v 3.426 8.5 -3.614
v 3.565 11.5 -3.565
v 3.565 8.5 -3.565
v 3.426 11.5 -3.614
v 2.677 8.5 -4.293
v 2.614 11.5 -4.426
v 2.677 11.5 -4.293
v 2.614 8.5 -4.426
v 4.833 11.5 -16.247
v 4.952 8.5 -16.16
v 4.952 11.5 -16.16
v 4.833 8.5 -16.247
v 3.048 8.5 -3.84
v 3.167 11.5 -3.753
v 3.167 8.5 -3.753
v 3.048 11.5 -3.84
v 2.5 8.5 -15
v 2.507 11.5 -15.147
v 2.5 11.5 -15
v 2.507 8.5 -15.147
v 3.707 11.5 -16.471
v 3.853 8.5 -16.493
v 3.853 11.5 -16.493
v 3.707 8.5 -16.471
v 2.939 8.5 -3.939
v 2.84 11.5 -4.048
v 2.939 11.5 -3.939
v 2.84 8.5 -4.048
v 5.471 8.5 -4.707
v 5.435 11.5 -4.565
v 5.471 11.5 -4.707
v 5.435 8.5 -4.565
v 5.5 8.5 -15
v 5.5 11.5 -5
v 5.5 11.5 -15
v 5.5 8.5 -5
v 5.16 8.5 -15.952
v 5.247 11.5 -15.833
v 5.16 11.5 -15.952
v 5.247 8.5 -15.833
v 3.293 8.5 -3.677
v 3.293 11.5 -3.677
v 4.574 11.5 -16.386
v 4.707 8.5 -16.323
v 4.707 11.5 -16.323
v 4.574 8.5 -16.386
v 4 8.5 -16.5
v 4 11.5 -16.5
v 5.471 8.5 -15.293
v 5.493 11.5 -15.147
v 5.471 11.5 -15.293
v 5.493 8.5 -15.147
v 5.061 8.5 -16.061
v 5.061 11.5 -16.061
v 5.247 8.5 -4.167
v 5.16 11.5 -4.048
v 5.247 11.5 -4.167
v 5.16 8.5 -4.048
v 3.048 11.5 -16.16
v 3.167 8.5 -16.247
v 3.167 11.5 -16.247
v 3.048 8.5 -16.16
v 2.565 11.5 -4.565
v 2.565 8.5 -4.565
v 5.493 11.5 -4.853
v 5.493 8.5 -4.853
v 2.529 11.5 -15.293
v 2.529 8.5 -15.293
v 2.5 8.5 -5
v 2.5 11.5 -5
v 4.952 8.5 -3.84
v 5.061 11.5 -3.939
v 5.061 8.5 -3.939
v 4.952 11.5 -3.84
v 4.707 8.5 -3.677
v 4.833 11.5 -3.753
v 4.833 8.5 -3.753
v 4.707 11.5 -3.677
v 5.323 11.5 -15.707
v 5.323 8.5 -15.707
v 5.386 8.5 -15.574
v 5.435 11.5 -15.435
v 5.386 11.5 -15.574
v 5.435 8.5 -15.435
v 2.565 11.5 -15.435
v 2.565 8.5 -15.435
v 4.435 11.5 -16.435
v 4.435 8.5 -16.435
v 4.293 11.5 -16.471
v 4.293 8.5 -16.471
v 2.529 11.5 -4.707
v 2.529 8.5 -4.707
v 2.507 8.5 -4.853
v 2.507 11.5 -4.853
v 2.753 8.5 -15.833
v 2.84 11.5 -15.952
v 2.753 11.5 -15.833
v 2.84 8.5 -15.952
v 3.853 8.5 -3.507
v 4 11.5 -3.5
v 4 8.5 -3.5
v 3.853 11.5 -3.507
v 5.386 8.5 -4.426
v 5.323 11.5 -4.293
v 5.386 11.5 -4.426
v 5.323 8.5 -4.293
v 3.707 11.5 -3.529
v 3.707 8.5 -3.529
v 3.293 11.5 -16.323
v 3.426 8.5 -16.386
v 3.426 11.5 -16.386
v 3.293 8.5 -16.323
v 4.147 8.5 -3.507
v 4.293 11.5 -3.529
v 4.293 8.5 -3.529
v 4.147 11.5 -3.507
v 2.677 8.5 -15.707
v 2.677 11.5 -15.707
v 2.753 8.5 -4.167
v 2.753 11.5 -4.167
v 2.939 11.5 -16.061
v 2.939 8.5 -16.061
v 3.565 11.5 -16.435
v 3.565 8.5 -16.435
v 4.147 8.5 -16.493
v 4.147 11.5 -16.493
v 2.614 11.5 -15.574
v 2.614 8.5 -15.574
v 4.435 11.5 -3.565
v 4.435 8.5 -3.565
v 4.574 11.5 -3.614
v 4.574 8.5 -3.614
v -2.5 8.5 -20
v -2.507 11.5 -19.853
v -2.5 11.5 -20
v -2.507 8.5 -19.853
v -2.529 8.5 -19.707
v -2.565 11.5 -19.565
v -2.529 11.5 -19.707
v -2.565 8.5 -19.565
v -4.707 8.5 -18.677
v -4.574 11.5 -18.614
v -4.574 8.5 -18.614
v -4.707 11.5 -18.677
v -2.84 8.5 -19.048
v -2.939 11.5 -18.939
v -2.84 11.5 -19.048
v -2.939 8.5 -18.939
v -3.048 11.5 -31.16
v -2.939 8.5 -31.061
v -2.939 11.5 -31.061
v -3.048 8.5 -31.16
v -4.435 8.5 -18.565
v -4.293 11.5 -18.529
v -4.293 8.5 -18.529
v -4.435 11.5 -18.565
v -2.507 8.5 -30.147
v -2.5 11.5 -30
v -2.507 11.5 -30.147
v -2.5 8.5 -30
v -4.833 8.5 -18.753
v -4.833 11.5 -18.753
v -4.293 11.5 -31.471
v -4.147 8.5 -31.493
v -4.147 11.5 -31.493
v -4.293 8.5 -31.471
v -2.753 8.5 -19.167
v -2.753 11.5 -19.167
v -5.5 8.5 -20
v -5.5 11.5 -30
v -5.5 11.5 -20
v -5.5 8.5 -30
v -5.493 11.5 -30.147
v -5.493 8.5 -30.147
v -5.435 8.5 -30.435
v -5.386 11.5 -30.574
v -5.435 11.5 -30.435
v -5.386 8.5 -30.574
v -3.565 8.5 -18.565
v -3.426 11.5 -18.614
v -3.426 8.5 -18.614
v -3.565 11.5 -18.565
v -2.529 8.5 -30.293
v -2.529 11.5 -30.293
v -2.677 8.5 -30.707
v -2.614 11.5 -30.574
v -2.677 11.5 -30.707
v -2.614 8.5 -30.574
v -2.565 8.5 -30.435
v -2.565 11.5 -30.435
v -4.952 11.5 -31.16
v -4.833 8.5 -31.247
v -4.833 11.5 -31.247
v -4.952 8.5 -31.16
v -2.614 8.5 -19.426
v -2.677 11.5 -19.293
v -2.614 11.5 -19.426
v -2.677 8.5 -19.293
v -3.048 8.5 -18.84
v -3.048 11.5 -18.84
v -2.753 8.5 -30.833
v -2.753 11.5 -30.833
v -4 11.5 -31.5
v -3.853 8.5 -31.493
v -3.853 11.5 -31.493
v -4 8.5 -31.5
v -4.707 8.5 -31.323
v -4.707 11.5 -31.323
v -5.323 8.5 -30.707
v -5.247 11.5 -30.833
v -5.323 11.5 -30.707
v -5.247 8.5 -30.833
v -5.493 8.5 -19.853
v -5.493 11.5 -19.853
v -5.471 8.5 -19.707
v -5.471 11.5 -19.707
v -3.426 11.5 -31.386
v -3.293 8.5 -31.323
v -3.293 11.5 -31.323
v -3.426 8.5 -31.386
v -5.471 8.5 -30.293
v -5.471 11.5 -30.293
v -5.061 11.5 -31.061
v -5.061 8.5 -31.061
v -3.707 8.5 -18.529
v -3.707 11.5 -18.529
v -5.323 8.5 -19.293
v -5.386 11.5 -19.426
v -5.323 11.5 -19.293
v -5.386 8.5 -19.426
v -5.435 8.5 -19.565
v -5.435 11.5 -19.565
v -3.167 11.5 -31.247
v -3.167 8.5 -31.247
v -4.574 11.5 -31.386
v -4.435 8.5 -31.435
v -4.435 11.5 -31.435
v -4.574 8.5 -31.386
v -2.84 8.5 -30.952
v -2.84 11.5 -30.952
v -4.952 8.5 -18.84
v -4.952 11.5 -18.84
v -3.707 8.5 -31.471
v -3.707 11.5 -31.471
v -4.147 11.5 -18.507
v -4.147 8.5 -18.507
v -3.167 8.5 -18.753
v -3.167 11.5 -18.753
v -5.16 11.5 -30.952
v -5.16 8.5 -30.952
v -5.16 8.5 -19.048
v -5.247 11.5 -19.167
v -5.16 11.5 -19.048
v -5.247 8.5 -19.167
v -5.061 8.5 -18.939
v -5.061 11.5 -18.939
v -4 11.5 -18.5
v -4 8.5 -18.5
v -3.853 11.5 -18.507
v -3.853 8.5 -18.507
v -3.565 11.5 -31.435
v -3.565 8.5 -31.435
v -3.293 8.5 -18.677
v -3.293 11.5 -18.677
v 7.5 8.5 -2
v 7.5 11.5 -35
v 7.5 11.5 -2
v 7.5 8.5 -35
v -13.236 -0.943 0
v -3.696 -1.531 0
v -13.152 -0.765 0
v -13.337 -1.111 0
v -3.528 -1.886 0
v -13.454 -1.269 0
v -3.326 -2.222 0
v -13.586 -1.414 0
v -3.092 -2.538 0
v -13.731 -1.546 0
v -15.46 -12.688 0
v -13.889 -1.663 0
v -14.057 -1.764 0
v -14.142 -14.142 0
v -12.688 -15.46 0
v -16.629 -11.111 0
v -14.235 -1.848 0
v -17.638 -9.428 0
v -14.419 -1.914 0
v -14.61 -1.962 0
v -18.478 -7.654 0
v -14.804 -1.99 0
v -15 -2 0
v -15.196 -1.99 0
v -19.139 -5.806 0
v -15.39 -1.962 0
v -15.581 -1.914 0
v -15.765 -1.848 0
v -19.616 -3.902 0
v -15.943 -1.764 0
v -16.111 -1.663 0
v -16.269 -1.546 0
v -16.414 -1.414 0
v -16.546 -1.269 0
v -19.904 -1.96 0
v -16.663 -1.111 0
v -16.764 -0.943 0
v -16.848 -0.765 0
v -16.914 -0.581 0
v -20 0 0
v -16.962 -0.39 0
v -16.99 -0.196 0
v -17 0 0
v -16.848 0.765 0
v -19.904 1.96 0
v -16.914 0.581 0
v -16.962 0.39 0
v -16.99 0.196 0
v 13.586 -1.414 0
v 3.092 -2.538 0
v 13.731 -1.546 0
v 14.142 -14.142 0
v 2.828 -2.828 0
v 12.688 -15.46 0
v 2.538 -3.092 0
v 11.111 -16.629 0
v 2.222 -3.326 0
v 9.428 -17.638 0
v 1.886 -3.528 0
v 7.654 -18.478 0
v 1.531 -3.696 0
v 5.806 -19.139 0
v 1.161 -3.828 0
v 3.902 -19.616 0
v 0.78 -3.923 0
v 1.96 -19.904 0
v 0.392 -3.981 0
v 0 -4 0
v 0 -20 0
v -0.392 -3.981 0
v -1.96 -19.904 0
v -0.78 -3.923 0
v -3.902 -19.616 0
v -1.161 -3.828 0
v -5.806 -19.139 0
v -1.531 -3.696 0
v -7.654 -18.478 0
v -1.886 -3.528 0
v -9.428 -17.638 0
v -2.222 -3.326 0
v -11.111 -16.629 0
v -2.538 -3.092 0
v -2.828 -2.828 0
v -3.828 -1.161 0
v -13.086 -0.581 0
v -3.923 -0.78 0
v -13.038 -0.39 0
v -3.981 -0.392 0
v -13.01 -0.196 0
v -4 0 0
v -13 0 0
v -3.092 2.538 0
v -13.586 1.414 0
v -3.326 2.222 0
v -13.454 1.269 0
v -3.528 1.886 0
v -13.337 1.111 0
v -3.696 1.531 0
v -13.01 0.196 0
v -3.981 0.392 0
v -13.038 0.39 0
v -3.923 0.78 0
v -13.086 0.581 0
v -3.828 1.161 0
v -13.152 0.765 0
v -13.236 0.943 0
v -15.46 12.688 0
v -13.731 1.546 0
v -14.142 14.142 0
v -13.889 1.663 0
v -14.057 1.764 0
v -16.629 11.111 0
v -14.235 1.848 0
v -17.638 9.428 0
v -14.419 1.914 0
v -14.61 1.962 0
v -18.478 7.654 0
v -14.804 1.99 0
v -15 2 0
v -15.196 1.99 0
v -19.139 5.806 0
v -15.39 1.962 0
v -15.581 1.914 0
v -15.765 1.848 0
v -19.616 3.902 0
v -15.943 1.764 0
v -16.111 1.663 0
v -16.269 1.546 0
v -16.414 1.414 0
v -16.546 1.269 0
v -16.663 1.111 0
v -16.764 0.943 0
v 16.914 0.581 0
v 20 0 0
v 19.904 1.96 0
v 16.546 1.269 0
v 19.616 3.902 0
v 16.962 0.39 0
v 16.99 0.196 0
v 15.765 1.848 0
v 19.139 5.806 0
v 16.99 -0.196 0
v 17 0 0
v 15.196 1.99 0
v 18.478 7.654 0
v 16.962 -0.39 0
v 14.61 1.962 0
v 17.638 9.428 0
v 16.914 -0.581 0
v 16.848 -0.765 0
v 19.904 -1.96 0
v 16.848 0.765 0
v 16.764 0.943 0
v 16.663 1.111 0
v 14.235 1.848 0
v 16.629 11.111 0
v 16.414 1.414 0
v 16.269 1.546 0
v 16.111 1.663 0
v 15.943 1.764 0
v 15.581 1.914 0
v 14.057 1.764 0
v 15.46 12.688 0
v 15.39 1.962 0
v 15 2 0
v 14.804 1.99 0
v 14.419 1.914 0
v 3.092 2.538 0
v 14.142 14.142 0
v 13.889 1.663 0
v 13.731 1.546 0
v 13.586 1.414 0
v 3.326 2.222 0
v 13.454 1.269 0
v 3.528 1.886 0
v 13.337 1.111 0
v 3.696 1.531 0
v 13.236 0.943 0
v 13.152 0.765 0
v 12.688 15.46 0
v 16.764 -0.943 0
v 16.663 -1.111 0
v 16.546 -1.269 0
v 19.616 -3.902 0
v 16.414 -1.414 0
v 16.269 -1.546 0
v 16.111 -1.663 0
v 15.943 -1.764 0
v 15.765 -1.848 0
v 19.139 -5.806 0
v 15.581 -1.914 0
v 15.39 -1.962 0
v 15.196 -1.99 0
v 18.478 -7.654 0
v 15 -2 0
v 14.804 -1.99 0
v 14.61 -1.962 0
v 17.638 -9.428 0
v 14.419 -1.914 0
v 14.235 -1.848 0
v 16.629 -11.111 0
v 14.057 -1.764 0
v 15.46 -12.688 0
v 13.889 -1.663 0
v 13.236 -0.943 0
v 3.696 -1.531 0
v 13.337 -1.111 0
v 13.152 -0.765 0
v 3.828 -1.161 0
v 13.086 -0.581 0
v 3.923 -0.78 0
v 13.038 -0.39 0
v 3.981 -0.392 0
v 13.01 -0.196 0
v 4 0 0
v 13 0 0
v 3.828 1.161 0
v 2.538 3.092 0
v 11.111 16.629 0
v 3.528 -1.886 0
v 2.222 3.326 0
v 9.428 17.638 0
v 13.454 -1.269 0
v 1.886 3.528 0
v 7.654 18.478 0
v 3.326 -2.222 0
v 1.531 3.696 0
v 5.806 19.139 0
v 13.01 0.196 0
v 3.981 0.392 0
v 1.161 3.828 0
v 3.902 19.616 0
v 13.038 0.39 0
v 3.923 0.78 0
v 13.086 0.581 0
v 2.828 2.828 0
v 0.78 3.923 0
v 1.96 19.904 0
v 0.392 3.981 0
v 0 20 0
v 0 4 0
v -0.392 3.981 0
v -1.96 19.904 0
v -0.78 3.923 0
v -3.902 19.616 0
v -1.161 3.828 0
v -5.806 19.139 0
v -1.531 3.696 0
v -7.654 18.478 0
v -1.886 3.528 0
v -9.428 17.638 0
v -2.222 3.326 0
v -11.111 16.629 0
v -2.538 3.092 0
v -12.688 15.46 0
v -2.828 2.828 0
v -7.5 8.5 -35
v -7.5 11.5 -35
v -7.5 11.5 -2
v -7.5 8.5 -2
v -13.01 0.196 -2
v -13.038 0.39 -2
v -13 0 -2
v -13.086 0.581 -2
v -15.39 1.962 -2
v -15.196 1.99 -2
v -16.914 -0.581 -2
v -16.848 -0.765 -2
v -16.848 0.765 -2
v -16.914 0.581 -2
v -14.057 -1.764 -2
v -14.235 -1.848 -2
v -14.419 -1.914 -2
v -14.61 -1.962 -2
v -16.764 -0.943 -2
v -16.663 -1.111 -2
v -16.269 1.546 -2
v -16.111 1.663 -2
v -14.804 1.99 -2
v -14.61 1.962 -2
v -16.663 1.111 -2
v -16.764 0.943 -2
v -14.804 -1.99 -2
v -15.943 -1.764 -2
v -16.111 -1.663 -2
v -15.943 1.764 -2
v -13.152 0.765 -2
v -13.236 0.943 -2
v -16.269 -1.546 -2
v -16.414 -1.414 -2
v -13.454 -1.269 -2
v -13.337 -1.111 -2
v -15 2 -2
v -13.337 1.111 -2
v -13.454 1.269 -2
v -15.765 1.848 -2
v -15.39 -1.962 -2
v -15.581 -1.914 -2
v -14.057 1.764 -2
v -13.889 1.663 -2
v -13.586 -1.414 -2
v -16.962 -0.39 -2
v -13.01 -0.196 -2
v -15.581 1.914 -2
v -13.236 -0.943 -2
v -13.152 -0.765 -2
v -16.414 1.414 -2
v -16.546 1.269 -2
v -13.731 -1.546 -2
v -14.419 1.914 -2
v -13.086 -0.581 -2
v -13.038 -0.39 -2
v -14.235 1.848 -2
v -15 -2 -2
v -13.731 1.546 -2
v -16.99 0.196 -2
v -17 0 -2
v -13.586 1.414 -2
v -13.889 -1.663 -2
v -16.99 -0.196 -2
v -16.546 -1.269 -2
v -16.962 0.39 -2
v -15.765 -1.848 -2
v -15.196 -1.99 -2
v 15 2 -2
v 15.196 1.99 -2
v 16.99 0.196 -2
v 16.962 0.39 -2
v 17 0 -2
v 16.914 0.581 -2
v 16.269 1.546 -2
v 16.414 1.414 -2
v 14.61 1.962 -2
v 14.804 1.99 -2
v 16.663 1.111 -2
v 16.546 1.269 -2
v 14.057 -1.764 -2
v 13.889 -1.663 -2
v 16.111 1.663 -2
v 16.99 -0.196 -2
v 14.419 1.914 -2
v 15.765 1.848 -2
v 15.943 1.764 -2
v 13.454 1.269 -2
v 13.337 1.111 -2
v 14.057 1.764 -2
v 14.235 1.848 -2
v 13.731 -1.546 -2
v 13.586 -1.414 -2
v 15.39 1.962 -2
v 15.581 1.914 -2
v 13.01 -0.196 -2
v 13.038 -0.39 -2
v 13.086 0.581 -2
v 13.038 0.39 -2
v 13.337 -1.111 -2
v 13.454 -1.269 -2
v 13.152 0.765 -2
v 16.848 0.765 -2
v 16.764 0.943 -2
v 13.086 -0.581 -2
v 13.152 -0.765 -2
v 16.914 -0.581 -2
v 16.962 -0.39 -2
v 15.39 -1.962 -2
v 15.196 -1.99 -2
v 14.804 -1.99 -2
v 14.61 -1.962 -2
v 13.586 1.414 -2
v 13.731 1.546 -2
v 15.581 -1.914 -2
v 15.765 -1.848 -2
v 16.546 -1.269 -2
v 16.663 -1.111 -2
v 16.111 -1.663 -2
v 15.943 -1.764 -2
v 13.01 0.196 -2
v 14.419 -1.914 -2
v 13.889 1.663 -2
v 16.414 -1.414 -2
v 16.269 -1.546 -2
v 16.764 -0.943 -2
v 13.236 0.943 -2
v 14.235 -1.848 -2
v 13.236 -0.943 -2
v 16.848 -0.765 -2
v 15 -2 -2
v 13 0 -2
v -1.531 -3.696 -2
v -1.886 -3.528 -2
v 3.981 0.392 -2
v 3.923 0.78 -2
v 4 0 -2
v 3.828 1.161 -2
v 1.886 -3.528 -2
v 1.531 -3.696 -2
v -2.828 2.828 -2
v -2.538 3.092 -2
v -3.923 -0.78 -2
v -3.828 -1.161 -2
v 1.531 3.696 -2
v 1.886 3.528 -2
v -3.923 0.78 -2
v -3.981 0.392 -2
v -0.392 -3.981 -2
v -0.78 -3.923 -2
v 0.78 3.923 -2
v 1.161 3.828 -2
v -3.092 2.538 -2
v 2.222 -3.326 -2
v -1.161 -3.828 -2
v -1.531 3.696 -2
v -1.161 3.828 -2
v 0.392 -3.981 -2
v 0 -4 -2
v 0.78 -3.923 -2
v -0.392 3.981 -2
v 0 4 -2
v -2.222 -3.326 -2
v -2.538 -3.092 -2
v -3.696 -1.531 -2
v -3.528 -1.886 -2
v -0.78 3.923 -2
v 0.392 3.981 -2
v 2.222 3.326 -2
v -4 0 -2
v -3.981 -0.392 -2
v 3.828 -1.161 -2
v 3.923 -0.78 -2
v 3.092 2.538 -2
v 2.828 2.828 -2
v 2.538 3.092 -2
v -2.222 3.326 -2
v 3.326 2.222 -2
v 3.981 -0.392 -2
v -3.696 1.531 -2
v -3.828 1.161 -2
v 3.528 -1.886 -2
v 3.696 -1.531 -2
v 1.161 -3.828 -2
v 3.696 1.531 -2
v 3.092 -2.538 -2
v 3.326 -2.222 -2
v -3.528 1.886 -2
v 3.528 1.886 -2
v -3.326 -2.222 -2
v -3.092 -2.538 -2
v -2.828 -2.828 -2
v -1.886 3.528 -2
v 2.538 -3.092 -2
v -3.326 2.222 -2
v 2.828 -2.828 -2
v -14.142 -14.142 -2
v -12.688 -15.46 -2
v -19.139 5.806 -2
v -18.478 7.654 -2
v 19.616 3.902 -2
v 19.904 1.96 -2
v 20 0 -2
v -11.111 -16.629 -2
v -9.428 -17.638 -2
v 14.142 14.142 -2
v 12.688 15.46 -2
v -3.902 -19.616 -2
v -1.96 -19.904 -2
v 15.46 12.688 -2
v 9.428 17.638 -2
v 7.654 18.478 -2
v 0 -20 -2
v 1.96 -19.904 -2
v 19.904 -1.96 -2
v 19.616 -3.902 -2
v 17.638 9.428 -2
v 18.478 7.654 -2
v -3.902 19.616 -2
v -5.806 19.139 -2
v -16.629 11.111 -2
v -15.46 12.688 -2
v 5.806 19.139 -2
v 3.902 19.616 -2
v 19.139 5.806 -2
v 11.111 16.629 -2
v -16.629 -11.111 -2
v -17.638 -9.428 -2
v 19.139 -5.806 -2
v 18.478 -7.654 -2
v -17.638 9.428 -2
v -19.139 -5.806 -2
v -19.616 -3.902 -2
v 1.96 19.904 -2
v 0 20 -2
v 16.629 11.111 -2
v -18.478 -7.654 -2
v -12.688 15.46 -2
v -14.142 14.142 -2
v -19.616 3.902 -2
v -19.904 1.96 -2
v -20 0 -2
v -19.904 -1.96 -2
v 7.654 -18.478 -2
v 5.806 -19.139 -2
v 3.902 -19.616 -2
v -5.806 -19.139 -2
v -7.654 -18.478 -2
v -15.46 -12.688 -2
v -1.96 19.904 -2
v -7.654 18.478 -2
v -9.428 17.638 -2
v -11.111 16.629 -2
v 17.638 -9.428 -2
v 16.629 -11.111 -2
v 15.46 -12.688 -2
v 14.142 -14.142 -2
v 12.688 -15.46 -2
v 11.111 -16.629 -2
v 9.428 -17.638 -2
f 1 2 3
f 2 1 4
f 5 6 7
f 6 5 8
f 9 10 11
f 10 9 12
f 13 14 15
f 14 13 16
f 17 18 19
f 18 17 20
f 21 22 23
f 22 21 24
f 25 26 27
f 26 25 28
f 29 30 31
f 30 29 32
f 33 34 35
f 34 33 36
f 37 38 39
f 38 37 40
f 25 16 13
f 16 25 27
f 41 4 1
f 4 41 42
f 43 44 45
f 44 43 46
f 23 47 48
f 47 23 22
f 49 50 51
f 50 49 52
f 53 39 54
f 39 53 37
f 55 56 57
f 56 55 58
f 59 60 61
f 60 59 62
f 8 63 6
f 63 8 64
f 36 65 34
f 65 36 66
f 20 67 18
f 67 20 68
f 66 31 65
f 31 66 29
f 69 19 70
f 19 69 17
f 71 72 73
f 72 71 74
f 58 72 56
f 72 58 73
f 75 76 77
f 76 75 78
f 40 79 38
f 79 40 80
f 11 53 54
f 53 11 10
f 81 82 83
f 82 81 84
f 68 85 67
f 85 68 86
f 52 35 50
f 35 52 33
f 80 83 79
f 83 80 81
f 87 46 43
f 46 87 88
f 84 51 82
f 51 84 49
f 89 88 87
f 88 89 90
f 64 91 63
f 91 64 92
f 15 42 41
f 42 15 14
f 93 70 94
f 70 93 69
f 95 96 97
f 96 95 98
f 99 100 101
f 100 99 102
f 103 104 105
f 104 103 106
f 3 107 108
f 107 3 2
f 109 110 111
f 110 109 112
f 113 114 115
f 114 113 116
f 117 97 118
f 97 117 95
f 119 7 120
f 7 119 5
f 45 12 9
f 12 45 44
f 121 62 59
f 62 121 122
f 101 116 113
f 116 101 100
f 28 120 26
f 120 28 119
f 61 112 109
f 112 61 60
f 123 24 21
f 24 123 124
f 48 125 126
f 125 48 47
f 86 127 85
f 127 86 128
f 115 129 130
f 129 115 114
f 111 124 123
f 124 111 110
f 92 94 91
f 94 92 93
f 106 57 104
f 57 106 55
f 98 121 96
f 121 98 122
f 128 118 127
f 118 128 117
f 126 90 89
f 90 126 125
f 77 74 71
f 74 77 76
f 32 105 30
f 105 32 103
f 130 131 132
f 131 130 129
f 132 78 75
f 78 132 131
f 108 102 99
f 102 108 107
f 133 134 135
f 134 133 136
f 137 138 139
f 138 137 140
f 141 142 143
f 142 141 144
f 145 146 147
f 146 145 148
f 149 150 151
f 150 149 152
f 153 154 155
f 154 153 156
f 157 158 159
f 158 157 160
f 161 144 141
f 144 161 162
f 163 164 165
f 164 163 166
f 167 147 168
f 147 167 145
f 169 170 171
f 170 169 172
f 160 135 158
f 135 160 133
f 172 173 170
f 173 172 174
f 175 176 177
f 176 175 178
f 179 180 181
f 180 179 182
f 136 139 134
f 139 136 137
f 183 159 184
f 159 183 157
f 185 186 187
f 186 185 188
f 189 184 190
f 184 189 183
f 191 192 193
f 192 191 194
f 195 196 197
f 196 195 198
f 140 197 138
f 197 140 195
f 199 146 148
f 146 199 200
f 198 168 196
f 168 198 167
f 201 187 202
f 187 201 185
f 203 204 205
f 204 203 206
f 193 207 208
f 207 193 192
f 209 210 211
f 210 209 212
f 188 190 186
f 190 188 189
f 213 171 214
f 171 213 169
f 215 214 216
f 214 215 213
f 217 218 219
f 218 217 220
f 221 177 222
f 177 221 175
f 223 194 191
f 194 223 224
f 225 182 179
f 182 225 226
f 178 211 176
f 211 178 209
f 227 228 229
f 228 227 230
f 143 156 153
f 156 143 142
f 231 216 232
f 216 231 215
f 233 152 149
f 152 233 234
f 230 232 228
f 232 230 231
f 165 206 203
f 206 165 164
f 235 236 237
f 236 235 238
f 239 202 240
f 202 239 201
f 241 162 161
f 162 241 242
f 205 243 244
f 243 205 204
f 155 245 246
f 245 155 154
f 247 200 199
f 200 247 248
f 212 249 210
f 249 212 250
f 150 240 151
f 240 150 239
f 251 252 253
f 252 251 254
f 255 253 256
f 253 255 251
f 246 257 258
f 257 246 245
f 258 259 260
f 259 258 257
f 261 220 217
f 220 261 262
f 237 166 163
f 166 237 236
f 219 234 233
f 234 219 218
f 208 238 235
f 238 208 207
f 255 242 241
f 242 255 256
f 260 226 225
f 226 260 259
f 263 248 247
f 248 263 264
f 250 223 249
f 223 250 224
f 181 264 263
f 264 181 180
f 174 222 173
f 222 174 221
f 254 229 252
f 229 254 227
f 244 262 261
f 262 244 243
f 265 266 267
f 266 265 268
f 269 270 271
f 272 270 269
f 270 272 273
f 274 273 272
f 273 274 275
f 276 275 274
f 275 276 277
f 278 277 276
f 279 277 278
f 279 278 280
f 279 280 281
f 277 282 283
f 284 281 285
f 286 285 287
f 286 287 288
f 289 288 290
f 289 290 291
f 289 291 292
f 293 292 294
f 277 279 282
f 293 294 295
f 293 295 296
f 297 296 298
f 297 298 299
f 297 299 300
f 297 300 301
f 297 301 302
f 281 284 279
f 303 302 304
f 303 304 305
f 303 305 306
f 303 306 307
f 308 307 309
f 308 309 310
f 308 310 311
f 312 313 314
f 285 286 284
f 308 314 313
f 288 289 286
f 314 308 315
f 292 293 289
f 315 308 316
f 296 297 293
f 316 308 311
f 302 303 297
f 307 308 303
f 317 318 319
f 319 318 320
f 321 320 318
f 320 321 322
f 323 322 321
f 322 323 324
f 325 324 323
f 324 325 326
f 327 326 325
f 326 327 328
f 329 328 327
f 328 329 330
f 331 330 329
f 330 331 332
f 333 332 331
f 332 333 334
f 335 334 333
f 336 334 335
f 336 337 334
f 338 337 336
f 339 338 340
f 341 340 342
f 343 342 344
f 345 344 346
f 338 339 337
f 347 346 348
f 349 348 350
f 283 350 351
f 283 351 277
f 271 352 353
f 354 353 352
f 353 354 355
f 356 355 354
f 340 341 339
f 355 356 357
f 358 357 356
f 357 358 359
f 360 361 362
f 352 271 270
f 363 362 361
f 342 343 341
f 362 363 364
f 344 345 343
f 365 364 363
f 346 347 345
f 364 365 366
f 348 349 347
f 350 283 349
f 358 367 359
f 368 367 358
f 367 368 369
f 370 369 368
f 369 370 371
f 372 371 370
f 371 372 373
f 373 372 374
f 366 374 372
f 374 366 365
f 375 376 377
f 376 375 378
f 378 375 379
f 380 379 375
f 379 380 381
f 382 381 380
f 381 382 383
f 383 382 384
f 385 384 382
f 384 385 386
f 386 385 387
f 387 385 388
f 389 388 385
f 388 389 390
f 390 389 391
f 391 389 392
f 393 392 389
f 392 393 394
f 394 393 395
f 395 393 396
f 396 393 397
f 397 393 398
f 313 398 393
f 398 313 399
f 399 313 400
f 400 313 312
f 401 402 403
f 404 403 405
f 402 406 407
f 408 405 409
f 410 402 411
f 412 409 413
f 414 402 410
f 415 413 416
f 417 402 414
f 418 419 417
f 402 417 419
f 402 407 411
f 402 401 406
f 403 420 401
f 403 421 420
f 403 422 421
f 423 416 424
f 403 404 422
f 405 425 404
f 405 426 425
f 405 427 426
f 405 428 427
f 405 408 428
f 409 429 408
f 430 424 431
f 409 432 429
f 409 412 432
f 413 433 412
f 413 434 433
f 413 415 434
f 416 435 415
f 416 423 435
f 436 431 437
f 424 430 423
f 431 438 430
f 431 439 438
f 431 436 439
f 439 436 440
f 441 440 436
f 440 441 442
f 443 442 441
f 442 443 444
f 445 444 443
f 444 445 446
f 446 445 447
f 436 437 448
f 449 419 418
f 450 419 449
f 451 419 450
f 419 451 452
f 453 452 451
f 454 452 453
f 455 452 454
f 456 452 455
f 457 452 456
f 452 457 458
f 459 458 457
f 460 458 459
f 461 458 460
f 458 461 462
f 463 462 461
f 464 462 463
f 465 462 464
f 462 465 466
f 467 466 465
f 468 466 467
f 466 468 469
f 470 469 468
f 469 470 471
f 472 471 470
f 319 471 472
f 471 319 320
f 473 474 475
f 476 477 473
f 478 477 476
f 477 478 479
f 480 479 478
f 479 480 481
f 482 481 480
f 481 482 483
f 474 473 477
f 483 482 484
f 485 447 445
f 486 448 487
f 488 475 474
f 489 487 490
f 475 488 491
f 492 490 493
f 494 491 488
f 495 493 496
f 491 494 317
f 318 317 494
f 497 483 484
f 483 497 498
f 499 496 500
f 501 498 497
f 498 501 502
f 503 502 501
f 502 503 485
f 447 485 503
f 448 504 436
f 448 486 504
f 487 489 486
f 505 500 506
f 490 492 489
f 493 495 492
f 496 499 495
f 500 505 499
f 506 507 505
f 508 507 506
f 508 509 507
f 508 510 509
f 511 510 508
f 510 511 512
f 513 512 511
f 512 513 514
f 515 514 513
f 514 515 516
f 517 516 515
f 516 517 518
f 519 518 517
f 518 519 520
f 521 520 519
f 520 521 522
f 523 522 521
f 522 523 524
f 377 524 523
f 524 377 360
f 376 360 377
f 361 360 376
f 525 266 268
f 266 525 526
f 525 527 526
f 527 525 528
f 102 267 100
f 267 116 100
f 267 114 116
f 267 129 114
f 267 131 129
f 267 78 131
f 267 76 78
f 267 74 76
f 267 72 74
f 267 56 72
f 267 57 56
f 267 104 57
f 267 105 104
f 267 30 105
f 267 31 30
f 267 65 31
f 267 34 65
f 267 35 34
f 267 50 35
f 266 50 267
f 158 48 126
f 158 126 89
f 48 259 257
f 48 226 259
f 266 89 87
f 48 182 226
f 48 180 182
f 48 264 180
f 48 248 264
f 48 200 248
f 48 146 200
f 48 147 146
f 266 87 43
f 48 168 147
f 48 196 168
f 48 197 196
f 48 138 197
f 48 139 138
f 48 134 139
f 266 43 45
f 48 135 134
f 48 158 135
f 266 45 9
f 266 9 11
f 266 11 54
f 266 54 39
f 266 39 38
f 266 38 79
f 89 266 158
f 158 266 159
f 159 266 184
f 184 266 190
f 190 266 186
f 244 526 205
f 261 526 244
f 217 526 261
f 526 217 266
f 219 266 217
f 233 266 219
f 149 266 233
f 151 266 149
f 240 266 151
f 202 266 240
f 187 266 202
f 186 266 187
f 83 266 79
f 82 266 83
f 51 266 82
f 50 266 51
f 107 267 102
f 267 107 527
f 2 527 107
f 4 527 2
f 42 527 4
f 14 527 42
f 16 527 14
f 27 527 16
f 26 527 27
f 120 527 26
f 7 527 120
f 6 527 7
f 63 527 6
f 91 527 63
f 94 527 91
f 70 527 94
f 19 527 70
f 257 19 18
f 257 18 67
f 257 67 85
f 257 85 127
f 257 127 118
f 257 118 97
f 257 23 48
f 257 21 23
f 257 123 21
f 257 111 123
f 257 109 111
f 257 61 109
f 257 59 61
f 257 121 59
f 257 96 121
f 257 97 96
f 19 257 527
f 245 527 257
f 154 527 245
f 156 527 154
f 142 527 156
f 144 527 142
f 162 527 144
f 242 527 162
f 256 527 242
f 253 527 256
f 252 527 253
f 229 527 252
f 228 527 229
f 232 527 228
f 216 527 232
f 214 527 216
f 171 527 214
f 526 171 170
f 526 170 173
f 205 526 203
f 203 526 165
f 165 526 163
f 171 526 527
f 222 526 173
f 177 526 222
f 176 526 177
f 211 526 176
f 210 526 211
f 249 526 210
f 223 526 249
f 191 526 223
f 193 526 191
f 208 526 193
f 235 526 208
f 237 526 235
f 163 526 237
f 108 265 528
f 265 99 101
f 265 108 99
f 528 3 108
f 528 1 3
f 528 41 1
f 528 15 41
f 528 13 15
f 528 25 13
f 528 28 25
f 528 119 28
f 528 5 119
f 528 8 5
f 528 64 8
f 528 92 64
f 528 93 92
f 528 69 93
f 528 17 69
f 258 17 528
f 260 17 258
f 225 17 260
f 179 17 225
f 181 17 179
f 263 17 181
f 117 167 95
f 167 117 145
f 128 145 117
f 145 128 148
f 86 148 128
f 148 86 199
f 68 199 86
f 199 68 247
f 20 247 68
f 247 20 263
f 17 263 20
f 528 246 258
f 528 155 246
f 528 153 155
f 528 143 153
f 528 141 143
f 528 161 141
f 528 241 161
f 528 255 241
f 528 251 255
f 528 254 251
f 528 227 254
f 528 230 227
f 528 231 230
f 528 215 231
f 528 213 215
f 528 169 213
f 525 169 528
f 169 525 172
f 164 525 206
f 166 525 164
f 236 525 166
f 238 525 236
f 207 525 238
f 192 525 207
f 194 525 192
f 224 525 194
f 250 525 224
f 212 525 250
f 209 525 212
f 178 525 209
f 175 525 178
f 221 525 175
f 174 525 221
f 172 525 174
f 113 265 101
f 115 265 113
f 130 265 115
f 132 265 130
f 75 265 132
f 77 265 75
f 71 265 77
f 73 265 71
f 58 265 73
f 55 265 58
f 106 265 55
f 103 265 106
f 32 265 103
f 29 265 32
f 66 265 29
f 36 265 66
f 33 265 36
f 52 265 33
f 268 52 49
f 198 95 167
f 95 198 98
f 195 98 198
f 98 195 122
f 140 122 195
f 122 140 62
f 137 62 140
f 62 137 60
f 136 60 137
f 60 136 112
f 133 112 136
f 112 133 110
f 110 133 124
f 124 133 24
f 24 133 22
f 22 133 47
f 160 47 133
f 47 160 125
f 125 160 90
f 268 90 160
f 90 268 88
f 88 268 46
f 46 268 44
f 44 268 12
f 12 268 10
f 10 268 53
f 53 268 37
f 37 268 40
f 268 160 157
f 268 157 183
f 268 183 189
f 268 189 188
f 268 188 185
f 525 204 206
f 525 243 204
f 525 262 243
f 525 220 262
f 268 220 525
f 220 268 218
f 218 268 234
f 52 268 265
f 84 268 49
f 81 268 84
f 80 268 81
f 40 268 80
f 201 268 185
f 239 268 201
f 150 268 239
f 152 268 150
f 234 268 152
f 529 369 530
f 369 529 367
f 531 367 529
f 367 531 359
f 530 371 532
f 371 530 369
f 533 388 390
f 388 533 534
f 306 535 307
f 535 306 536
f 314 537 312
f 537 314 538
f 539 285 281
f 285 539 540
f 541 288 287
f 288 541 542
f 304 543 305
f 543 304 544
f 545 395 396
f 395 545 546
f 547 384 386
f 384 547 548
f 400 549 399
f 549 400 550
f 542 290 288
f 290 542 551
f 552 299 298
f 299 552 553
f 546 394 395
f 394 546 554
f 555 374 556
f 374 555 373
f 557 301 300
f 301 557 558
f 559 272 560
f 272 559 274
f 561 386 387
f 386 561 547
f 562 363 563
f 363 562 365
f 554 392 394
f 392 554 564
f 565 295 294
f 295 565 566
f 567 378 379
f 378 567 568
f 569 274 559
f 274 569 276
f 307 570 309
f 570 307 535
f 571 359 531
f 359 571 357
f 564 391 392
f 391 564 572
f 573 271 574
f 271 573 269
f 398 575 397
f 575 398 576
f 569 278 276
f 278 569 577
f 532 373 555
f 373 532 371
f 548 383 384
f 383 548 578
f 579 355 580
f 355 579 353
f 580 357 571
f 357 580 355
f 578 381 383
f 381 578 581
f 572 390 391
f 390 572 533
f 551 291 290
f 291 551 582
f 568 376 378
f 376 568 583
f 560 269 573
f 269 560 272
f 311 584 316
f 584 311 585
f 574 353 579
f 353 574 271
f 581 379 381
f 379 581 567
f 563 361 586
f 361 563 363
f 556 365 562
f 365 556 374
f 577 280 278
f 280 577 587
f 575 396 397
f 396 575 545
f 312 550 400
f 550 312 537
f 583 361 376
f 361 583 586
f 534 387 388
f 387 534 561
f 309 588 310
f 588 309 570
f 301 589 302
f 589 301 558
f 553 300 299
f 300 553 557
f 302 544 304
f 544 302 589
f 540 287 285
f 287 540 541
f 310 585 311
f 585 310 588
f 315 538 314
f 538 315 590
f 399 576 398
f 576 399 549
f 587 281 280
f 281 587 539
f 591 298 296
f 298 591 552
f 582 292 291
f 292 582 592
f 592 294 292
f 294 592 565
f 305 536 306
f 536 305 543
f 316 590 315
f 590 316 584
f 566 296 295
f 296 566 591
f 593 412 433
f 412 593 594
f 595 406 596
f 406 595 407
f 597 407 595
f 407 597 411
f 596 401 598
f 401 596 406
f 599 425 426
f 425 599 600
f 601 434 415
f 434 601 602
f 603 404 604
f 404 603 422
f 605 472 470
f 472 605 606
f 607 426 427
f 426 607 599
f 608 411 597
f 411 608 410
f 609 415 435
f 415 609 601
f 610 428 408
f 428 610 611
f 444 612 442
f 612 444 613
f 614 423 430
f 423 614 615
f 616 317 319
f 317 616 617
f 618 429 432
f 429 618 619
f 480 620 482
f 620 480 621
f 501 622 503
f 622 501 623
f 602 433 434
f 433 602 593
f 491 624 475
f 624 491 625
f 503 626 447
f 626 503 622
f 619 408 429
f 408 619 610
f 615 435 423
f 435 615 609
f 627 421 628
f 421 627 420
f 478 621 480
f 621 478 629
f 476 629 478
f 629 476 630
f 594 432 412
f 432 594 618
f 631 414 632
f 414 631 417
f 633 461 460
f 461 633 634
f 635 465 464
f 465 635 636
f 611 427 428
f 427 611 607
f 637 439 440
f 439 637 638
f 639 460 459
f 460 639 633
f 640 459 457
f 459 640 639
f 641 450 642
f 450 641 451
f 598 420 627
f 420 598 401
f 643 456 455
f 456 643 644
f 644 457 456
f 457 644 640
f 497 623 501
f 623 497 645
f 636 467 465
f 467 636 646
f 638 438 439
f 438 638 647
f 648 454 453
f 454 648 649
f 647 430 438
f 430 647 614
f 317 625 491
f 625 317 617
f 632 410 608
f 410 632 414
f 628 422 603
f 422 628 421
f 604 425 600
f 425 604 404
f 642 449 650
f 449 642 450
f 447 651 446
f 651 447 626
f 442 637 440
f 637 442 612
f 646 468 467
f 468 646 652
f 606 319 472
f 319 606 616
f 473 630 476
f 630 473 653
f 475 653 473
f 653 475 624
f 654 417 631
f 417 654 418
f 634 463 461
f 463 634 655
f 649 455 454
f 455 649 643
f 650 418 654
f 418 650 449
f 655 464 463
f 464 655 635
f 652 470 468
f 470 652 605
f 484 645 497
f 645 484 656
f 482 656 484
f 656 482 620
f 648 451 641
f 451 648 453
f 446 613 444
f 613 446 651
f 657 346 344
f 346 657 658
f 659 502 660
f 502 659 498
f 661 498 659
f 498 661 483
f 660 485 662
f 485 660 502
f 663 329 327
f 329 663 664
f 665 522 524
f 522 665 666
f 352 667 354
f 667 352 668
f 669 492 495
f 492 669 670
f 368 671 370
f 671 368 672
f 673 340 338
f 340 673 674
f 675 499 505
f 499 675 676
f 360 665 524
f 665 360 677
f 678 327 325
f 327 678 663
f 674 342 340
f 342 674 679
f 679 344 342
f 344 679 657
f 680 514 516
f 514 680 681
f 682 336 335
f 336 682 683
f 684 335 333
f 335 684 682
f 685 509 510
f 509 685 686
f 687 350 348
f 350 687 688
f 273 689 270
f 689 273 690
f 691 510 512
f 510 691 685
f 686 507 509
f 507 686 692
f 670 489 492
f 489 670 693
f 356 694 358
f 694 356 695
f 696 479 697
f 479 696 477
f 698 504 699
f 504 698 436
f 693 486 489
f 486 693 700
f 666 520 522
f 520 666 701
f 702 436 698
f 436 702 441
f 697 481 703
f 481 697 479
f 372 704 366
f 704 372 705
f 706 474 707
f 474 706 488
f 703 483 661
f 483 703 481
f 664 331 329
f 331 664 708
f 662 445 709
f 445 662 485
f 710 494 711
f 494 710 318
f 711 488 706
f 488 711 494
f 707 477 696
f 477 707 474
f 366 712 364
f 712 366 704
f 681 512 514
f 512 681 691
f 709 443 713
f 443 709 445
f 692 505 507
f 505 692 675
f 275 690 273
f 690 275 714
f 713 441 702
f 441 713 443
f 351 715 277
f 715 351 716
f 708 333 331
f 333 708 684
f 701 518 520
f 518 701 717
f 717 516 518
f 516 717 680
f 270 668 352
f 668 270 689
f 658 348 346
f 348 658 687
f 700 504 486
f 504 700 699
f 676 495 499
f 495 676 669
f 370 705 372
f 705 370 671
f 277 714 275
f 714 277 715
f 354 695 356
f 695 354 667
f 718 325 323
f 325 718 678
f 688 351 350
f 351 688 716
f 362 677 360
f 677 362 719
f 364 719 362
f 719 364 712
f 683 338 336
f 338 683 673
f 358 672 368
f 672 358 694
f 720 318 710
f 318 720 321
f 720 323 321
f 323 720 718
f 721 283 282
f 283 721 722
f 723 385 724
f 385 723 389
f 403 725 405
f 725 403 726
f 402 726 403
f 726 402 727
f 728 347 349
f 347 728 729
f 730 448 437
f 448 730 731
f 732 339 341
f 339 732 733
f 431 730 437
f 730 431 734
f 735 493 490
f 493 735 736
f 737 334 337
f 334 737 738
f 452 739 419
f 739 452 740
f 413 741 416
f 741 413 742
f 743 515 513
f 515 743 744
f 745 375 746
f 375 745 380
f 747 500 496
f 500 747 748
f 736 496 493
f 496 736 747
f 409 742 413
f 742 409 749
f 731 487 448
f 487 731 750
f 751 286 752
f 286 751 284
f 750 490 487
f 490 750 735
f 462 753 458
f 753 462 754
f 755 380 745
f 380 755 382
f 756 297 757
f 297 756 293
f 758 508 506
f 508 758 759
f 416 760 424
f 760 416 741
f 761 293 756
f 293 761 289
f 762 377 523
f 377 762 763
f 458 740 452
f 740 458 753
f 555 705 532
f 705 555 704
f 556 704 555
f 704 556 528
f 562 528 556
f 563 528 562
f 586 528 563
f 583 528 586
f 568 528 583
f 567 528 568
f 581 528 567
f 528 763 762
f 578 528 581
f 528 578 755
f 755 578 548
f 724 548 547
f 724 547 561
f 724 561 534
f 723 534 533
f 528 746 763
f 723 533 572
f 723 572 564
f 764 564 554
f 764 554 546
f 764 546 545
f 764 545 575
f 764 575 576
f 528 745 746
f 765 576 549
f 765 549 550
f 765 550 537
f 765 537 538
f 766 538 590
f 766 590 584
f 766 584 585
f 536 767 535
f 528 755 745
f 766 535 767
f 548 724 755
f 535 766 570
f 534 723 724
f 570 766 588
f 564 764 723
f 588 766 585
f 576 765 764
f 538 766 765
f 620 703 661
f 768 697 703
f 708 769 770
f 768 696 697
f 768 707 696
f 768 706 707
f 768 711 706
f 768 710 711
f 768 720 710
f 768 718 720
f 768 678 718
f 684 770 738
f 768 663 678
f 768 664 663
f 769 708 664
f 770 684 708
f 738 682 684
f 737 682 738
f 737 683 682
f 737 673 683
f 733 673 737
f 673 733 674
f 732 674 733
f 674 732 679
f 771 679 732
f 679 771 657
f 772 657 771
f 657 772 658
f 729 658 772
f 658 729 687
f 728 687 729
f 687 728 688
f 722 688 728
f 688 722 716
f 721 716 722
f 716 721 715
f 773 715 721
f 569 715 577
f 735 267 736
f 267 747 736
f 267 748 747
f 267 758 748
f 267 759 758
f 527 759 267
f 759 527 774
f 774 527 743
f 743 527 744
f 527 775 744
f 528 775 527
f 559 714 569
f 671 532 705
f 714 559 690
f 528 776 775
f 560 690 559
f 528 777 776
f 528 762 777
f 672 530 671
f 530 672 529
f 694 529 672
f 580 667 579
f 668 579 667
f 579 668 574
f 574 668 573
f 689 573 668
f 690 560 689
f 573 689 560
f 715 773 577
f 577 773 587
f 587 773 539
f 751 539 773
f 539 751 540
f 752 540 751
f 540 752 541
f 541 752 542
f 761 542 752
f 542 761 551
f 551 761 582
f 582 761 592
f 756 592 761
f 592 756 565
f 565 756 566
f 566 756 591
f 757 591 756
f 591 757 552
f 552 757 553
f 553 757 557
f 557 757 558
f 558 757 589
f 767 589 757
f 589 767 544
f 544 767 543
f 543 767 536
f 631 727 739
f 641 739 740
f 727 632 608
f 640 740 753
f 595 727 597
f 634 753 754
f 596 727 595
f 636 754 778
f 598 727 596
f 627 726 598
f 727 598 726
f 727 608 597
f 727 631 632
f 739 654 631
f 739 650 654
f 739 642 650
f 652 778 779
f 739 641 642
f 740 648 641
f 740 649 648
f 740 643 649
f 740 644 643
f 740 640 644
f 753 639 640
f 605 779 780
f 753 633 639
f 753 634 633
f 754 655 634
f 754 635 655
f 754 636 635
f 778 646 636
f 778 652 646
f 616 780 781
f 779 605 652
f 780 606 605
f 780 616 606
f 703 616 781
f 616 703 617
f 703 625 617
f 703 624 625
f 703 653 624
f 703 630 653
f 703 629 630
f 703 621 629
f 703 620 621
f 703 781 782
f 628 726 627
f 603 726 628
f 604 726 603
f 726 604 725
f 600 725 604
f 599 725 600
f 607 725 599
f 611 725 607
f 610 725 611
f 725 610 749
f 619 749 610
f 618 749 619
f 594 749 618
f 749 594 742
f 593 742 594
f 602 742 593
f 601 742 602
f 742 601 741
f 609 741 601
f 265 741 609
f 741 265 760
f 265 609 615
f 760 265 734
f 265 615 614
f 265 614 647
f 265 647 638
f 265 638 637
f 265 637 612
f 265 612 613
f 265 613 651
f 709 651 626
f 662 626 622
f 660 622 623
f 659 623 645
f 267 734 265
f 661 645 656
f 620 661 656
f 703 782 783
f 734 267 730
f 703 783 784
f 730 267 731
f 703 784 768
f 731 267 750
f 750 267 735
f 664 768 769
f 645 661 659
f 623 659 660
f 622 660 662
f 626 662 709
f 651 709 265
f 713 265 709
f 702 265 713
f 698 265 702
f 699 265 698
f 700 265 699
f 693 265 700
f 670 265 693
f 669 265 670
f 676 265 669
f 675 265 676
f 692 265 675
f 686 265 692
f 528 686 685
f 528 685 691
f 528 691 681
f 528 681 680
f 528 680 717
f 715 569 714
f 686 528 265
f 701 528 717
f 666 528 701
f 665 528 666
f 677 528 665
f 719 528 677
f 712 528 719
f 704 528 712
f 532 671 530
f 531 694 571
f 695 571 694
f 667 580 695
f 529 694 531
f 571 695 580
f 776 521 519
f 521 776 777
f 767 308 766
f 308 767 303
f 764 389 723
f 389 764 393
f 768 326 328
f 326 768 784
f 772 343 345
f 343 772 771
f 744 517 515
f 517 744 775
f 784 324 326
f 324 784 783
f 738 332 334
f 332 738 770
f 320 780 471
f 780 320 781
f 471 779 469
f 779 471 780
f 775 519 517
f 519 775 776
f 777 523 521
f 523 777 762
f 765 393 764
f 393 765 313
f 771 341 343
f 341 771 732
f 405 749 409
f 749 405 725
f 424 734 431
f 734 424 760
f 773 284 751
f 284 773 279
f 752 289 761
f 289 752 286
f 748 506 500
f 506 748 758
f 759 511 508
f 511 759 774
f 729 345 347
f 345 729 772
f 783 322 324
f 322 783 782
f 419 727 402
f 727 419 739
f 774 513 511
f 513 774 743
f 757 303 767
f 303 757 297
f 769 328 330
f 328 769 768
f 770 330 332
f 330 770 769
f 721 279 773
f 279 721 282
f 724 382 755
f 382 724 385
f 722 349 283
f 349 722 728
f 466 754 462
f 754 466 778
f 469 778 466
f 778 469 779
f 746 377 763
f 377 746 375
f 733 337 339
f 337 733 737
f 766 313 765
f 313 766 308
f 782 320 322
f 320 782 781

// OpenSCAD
// file: settings.scad
/* BandMate Project, settings.scad
 * settings.scad by Oskari Rundgren is licensed under the
 * Creative Commons Attribution-ShareAlike 4.0 International License.
 */

bar_width = 30;
bar_height = 3;
bar_length = 300; 
// file: other_parts.scad
/* BandMate Project, other_parts.scad
 * other_parts.scad by Oskari Rundgren is licensed under the
 * Creative Commons Attribution-ShareAlike 4.0 International License.
 */

$fn = 64;

include <settings.scad>

//bearing(hole_radius=5, radius=15,width=9);

solenoid();

/* Solenoid push pull type. */
module solenoid()
{
	translate([0,0,7.5]) cube([30,17,15],center=true);
	translate([15+17/2,0,15/2]) rotate([0,90,0]) cylinder(r=3,h=17,center=true);
	translate([-15-13/2,0,15/2]) rotate([0,90,0]) cylinder(r=1.5,h=13,center=true);

}

/* Two metal rods. */
module rods(length=300)
{
	translate([0,20,0]) rotate([0,90,0]) cylinder(r=4, h=length);
	translate([0,-20,0]) rotate([0,90,0]) cylinder(r=4, h=length);
}

/* Belt. */
module belt(radius,length)
{
	difference()
	{
	hull()
	{
		translate([length,0,0]) cylinder(r=radius+2,h=5,center=true);
		translate([0,0,0]) cylinder(r=radius+2,h=5,center=true);
	}
	hull()
	{
		translate([length,0,0]) cylinder(r=radius,h=7,center=true);
		translate([0,0,0]) cylinder(r=radius,h=7,center=true);
	}
	}
}

/* Hexnut. */
module hexnut(width,height)
{
	translate([0,0,height/2]) rotate([0,0,0]) cube([width,tan(30)*width,height],center=true);
	translate([0,0,height/2]) rotate([0,0,60]) cube([width,tan(30)*width,height],center=true);
	translate([0,0,height/2]) rotate([0,0,120]) cube([width,tan(30)*width,height],center=true);

}

/* Flat metal bar under the string. */
module bar()
{
	translate([bar_length/2+30,0,bar_height/2]) cube([bar_length,bar_width,bar_height],center=true);
}

module bearing(hole_radius=8.5, radius=20,width=12)
{	
	//translate([0,0,radius+3])
	rotate([90,0,0]) 
	difference()
	{
		cylinder(r=radius, h=width,center=true);
		cylinder(r=hole_radius, h=width*1.1,center=true);
	}
}
// main file
/* BandMate Project, striker.scad
 * striker.scad by Oskari Rundgren is licensed under the
 * Creative Commons Attribution-ShareAlike 4.0 International License.
 */

$fn = 64;

use <other_parts.scad>


%translate([-7.5,0,-20]) rotate([0,90,0]) solenoid();

difference()
{
	translate([0,10,-35/2]) cube([15,3,35],center=true);
	union()
	{
	hull()
	{
		translate([4,0,-5]) rotate([90,0,0]) cylinder(r=1.5,h=50,center=true); 
		translate([4,0,-15]) rotate([90,0,0]) cylinder(r=1.5,h=50,center=true); 
	}
	hull()
	{
		translate([-4,0,-30]) rotate([90,0,0]) cylinder(r=1.5,h=50,center=true); 
		translate([-4,0,-20]) rotate([90,0,0]) cylinder(r=1.5,h=50,center=true); 
	}
	}
}

translate([0,0,-2]) bottom_plate(); // Bottom plate. 

/* Bottom plate. */
module bottom_plate()
{
  difference()
  {
/*    linear_extrude(height=2)
    hull()
    {
      translate([-30/2,0,0]) circle(r=2+2);
      circle(r=10); 
      translate([30/2,0,0]) circle(r=2+2);
    }*/
	cylinder(r=20,h=2);
		
    union() // Screw holes. 
    {
      translate([-30/2,0,0]) cylinder(r=2,h=10,center=true);
      translate([30/2,0,0]) cylinder(r=2,h=10,center=true);
      translate([0,0,0]) cylinder(r=4,h=10,center=true);  // Center hole. 

    }
  }
}
